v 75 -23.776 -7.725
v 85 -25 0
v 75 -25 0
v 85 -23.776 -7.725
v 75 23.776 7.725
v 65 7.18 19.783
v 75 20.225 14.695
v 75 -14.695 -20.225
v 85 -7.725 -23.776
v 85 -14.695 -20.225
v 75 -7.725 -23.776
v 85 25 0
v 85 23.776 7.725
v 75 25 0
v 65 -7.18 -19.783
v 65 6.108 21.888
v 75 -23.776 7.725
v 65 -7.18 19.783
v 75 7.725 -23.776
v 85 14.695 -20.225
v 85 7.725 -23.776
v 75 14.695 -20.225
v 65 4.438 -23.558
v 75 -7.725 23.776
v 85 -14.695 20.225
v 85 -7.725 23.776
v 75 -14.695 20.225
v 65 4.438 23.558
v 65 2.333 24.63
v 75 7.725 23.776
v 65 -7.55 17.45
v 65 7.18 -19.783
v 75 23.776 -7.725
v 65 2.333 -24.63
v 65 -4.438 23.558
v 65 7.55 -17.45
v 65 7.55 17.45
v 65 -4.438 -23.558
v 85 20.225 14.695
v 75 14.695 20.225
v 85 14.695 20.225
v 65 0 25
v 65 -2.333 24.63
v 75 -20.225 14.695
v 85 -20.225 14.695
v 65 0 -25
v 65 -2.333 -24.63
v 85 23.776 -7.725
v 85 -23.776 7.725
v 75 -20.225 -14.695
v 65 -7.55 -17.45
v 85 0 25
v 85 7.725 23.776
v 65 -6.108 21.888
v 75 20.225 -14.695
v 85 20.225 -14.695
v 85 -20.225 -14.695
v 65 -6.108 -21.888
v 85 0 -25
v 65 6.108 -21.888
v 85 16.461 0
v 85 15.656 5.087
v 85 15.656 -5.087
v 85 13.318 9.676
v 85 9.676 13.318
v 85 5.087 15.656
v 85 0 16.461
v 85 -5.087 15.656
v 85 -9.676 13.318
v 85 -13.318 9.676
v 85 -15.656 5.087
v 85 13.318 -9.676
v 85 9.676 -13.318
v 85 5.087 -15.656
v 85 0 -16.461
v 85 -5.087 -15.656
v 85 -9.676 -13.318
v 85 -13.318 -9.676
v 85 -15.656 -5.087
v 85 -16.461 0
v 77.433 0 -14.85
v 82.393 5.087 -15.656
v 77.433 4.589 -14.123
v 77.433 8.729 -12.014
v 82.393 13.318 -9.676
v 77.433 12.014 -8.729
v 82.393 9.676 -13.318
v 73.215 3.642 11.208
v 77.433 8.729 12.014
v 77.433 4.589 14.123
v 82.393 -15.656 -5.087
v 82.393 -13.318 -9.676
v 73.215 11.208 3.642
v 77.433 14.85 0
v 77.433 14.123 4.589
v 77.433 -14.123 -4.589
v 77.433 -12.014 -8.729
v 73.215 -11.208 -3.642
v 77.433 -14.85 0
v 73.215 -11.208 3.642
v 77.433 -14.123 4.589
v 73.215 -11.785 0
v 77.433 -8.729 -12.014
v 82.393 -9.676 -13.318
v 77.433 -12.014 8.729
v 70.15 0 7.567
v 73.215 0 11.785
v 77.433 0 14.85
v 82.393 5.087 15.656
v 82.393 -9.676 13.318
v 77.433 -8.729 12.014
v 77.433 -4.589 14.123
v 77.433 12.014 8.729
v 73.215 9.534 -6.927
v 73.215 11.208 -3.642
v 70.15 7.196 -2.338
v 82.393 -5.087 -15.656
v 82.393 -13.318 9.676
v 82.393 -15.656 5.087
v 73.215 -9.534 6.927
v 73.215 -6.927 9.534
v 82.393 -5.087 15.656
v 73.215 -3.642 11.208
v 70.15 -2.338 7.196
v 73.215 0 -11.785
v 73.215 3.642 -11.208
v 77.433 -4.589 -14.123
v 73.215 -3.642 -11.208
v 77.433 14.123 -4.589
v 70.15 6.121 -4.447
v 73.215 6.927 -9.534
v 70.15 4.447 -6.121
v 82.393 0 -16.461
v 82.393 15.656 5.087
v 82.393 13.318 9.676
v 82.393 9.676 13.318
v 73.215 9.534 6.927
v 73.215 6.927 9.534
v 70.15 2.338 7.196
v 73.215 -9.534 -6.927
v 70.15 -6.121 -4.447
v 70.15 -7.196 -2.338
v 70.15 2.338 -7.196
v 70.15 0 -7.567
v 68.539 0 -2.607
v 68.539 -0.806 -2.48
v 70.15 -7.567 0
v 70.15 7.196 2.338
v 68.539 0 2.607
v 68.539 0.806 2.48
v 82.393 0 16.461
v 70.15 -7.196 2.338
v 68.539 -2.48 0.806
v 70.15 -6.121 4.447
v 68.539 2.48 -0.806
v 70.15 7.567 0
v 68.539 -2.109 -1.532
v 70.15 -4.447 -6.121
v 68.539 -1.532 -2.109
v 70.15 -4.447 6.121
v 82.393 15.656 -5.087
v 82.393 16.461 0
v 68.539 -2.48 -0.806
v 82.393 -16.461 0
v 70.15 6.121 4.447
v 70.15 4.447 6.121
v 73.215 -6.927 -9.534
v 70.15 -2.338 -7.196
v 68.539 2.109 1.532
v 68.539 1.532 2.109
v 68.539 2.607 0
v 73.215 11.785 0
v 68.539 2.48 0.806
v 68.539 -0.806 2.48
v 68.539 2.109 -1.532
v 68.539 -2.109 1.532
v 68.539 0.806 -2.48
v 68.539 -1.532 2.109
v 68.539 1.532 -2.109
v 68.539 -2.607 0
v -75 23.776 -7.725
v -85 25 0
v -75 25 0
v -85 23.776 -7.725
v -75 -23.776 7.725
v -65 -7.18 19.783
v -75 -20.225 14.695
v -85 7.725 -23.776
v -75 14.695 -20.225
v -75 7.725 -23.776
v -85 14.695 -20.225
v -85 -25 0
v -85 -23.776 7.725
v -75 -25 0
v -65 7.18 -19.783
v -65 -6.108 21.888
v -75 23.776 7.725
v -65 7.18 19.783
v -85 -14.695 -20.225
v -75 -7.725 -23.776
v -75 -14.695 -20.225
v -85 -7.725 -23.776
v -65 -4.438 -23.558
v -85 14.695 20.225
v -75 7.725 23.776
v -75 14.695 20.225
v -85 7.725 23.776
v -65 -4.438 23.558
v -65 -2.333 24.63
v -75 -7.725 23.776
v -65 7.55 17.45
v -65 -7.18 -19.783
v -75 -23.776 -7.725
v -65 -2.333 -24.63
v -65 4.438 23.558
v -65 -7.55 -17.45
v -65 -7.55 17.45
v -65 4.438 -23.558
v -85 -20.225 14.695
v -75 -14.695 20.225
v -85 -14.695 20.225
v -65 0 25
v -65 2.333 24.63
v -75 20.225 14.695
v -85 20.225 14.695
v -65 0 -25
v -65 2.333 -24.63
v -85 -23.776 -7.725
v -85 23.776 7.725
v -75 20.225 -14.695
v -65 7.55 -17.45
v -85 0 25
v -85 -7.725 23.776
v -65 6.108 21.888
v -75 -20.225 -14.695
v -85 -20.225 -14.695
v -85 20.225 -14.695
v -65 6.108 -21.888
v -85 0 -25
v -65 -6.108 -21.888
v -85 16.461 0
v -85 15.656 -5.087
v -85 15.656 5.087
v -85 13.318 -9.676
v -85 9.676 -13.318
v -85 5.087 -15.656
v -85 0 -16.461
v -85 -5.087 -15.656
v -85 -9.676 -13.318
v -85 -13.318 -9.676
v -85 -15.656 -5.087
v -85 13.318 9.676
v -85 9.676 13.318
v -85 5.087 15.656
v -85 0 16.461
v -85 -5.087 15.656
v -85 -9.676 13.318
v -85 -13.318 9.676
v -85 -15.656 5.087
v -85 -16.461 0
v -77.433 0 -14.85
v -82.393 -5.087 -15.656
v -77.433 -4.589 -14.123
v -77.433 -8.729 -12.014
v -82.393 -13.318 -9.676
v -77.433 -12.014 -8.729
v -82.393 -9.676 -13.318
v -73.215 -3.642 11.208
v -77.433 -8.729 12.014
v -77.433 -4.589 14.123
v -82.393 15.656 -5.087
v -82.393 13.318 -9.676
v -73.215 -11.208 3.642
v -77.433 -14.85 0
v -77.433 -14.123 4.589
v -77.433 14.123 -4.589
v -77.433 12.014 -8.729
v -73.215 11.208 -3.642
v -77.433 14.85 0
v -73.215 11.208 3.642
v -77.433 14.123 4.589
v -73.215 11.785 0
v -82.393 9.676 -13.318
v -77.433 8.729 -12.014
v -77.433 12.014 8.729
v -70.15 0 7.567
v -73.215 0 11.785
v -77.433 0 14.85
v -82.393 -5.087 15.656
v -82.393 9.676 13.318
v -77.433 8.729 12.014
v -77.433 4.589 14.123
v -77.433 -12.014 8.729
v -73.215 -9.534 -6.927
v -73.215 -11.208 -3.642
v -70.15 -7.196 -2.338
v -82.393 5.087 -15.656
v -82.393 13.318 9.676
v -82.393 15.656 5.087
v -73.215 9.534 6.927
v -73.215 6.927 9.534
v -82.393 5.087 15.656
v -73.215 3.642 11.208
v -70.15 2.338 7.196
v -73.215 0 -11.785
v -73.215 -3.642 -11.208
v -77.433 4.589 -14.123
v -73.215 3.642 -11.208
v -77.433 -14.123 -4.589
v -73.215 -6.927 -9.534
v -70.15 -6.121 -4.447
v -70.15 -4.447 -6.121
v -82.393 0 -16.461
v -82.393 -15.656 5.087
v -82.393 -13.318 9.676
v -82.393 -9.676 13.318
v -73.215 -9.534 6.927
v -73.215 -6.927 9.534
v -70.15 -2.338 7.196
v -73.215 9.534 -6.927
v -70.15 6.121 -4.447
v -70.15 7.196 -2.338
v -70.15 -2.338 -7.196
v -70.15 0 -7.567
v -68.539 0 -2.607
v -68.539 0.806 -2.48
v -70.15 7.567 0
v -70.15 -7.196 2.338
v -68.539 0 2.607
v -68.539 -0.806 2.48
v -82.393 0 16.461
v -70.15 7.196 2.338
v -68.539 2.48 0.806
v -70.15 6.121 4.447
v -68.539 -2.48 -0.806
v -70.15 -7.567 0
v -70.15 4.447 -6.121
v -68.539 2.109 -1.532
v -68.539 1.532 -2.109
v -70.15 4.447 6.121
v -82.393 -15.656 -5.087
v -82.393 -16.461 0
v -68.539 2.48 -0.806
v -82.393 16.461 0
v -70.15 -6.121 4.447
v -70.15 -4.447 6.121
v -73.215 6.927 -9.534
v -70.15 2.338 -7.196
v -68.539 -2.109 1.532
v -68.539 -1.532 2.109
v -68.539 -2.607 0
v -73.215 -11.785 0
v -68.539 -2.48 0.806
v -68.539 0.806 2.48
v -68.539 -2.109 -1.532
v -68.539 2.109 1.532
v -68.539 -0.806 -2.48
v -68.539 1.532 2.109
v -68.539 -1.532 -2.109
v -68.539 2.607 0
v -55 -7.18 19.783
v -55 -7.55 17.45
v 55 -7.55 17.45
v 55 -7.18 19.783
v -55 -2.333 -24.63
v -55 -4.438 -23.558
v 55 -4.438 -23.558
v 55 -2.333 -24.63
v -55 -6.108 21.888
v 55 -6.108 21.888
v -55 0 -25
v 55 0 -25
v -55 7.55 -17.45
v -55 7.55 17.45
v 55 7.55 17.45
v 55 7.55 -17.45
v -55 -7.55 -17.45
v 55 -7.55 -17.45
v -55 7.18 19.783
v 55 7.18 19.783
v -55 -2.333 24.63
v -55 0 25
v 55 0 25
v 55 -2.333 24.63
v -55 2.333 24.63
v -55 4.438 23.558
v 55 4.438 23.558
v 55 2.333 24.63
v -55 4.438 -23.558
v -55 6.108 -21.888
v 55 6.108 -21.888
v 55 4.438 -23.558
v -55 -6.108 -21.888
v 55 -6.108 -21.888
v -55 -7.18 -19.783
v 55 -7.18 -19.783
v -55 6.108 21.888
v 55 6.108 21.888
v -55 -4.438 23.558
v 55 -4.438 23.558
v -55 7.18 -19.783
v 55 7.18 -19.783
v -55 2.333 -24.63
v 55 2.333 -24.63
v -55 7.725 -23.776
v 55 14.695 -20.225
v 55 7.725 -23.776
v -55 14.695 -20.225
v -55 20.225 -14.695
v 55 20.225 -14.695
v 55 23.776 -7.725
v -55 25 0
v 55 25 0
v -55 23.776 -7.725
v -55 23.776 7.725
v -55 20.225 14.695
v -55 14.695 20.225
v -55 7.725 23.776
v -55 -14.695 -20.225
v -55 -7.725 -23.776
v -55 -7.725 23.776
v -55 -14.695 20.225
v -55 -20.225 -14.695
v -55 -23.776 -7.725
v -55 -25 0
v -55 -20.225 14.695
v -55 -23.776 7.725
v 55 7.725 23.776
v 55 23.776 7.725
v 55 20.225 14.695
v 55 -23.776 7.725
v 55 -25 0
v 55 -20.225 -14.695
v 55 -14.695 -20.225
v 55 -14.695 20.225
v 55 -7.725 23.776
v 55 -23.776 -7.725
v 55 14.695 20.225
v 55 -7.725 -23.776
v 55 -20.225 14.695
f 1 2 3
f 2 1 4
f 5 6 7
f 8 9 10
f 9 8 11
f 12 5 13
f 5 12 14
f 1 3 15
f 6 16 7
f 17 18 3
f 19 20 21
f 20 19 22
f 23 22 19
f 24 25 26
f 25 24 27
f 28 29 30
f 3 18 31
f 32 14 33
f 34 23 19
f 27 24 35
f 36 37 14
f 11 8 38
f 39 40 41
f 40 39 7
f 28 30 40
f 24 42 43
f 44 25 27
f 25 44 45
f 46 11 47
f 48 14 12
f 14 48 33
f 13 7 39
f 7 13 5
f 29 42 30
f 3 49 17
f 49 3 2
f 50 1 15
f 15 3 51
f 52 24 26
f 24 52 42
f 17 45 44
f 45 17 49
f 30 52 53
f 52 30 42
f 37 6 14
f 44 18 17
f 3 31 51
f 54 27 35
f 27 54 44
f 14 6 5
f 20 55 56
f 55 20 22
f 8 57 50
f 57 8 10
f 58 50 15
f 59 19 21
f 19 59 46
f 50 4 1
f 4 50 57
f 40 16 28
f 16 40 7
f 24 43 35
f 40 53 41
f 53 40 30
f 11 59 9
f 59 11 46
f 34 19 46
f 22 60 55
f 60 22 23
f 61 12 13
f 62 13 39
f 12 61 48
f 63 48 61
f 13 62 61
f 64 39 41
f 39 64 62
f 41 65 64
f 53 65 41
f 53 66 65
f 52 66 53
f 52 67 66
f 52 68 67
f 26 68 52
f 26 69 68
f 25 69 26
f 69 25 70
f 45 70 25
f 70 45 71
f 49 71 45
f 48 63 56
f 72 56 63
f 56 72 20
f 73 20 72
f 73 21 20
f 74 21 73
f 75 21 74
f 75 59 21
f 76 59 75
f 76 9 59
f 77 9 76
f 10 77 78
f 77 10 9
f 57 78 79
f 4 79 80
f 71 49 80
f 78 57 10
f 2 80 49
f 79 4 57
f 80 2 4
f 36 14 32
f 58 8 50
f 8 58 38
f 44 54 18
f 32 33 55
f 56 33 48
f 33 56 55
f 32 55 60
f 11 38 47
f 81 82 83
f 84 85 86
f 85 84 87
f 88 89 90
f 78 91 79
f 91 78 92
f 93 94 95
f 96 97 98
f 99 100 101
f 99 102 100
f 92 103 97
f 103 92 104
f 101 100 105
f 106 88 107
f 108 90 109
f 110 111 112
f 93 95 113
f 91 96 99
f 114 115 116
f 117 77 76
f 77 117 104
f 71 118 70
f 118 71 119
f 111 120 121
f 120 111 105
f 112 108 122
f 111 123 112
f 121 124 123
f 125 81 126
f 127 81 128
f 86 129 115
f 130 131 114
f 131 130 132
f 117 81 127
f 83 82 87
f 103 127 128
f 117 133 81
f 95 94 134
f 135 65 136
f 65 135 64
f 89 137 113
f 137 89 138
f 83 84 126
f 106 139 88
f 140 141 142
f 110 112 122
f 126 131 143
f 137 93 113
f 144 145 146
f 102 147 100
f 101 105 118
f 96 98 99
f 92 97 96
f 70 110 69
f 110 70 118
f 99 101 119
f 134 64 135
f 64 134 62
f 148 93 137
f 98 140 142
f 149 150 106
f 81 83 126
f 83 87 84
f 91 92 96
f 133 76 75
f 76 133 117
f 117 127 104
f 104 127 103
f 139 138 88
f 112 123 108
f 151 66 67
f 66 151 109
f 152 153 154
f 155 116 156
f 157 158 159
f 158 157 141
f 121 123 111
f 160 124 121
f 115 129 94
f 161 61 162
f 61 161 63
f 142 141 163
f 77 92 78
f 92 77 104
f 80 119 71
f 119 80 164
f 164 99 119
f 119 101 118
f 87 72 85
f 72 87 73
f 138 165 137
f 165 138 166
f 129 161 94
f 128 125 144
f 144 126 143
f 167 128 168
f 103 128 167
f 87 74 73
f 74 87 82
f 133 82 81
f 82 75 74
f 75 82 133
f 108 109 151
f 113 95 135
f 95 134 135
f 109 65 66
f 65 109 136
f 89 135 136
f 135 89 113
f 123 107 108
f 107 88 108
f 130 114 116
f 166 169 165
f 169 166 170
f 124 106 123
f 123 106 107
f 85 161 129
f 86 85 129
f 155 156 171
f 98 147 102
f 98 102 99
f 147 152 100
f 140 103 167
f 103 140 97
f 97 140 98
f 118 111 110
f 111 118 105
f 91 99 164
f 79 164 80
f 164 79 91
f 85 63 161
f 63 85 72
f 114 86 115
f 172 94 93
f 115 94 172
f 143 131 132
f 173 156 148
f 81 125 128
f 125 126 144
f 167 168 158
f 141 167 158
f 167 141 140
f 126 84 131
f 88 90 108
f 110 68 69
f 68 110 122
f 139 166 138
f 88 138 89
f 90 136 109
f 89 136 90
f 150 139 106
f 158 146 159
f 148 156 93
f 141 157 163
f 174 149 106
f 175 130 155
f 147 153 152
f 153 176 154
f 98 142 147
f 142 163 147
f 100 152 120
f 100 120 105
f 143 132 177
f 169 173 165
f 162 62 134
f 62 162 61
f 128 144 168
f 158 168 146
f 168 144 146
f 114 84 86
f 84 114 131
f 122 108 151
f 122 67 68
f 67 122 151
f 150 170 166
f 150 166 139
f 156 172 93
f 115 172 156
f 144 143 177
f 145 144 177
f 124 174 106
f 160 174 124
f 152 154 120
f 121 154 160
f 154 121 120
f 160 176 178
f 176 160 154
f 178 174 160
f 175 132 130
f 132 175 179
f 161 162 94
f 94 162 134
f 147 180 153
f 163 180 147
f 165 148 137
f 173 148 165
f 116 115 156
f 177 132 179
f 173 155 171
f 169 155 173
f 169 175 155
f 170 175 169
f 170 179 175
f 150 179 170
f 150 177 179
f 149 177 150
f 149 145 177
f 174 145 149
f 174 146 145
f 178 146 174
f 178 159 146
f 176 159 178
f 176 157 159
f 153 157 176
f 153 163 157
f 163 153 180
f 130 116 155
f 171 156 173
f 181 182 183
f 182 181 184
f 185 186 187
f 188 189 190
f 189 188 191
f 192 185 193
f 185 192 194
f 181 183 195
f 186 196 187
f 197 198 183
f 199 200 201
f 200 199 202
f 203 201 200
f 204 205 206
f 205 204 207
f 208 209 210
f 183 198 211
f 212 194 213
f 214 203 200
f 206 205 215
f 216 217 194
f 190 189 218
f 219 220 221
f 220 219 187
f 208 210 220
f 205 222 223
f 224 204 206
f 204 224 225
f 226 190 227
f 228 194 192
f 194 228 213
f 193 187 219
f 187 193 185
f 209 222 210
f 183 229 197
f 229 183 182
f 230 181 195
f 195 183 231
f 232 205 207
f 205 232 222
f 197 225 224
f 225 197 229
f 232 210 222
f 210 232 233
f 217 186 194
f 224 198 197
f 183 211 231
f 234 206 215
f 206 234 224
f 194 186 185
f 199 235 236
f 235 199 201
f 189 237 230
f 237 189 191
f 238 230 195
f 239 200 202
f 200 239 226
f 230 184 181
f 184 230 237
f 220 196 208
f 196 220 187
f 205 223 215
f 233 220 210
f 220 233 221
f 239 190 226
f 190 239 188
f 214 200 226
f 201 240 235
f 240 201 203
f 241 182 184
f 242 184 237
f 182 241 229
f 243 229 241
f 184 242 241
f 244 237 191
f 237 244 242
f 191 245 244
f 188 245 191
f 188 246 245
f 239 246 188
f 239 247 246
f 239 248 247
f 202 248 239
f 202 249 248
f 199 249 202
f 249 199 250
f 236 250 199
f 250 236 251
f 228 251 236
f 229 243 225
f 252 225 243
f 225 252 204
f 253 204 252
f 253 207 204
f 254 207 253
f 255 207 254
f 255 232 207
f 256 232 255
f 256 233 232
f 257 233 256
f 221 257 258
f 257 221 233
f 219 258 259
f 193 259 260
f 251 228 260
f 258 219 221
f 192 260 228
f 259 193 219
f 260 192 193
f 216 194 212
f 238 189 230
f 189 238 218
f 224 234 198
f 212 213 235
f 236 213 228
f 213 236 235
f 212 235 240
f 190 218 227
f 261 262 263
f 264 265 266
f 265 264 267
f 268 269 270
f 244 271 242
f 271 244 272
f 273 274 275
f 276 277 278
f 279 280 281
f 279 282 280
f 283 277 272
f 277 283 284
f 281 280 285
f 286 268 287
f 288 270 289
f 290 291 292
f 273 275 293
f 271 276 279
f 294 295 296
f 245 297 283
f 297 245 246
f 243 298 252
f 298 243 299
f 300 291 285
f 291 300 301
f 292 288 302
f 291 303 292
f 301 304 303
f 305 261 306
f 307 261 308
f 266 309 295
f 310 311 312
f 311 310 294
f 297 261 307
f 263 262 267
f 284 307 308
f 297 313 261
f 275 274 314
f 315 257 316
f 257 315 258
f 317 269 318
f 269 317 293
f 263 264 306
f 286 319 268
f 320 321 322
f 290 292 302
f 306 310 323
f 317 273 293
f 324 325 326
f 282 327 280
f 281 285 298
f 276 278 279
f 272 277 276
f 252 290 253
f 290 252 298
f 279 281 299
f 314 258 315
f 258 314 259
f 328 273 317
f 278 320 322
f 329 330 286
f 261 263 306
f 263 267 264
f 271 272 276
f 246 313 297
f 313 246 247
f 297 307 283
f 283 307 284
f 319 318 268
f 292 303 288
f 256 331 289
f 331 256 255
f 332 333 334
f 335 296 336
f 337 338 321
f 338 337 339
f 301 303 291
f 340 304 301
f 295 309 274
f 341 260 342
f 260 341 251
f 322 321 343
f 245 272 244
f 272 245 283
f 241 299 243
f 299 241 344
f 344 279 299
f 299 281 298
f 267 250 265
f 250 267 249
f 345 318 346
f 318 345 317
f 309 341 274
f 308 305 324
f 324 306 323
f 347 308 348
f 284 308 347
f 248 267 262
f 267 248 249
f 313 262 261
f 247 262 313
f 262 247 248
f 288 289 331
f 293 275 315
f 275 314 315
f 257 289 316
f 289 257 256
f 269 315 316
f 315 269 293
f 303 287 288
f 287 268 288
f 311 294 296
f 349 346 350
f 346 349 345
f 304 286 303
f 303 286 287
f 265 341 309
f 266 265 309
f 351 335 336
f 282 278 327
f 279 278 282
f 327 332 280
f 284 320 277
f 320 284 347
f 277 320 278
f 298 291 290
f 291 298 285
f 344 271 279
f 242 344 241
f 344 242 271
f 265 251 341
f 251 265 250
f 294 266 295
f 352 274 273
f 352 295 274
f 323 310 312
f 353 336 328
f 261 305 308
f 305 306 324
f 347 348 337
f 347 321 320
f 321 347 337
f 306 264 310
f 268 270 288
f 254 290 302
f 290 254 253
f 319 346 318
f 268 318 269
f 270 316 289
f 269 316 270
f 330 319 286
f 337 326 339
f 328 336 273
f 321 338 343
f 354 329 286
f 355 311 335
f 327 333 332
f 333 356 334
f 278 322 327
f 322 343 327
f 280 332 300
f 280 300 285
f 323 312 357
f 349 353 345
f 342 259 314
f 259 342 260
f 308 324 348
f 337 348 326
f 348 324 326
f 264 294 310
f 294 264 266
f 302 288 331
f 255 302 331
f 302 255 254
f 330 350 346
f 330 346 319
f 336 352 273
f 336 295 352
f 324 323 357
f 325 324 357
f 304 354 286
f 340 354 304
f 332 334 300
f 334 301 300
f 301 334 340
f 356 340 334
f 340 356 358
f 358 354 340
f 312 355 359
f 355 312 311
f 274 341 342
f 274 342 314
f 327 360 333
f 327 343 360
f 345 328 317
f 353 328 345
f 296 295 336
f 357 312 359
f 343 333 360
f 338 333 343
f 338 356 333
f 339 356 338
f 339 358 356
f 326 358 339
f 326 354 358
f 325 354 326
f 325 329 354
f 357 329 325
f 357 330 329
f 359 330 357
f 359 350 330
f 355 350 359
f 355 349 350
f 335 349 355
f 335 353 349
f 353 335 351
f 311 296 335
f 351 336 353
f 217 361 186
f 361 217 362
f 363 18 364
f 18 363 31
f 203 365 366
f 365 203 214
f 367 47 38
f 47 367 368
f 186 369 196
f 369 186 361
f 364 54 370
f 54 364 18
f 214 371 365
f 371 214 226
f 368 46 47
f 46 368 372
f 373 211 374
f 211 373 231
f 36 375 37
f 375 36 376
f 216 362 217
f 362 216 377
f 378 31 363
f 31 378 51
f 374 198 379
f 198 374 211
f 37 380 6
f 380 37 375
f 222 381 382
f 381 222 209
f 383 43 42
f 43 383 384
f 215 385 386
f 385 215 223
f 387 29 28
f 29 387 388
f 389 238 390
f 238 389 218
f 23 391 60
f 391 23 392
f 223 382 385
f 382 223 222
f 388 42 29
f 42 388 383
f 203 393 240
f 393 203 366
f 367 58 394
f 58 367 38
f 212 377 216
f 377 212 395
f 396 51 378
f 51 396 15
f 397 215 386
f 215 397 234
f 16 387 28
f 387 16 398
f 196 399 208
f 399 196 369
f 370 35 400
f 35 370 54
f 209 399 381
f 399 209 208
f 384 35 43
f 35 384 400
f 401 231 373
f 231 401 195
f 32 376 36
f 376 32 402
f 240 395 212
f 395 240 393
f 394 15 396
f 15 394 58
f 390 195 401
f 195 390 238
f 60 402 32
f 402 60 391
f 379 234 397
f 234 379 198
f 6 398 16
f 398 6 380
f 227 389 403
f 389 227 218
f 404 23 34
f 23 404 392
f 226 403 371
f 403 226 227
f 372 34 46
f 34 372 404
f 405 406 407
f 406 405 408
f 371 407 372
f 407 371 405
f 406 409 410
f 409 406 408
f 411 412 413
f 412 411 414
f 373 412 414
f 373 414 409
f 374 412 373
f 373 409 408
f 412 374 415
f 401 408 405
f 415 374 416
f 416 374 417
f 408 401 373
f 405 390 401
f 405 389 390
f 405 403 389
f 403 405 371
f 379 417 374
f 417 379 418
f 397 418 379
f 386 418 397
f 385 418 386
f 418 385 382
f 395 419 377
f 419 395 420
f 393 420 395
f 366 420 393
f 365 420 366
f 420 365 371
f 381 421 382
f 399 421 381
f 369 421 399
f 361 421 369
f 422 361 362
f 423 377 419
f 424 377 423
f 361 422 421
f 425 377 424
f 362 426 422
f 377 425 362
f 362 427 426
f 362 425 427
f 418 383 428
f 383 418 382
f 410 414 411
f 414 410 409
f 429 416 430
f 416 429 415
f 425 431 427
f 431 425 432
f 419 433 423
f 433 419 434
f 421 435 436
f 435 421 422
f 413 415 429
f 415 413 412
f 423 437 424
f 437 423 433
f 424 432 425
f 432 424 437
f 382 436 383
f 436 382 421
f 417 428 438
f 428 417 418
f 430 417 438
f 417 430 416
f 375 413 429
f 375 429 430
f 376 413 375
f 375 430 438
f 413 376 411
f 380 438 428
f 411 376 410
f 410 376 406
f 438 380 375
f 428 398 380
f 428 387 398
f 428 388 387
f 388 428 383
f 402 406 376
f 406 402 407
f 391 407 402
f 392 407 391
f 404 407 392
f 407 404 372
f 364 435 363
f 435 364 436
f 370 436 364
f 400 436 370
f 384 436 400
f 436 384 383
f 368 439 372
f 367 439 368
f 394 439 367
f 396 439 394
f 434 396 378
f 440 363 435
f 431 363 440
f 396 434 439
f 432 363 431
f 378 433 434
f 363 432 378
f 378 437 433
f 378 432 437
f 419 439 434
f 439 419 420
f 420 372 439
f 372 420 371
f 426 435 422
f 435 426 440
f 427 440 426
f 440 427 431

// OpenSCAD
//roundcorner = true;
roundcorner = false;

//rc = true; 
rc = false;


$fn = roundcorner ? (rc ? 200 : 20) : 20;


roundcorner_size = roundcorner ? 5 : 0;

roller_main_shaft_length = 110;
roller_diameter = 50;

hanger_slot_span_slop = 0.1;
hanger_slot_span = 15 + hanger_slot_span_slop;

hanger_slot_width_slop = 0.0;
hanger_slot_width = 10 + hanger_slot_width_slop;

cap_crown_height = 10;
cap_funnel_height = 10;


module yardstick() {
    //translate([0, hanger_slot_span / 4, 0]) color("purple") cube([roller_diameter, hanger_slot_span, roller_main_shaft_length + ((hanger_slot_width + cap_funnel_height + cap_crown_height ) * 2)], center = true);
    translate([0, hanger_slot_span / 4, 0]) color("purple") cube([roller_diameter, hanger_slot_span, roller_main_shaft_length+ ((hanger_slot_width + cap_funnel_height + cap_crown_height ) * 2)], center = true);
}


module spine () {

    color("purple") hull () {
        translate([      (roller_diameter / 2) - (hanger_slot_span / 2), 0, 0] ) {
            cylinder(d = hanger_slot_span, h = roller_main_shaft_length + ((hanger_slot_width ) * 2), center = true);
        }
        translate([-1 * ((roller_diameter / 2) - (hanger_slot_span / 2)), 0, 0]) {
            cylinder(d = hanger_slot_span, h = roller_main_shaft_length + ((hanger_slot_width) * 2), center = true);
        }
    }    
}

module torso () {
    if (roundcorner) {
        minkowski() {
            cylinder(d = roller_diameter - roundcorner_size, h = roller_main_shaft_length - roundcorner_size, center = true);
            sphere(d=roundcorner_size);
        }
    } else {
        cylinder(d = roller_diameter, h = roller_main_shaft_length, center = true);
    }
}

module cap () {

    translate([0, 0, (roller_main_shaft_length / 2) + hanger_slot_width]) {

difference () {        
        color("pink") hull () {


            translate([      (roller_diameter / 2) - (hanger_slot_span / 2), 0, cap_funnel_height / 2] ) {
                color("green") cylinder(d = hanger_slot_span, h = cap_funnel_height, center = true);
            }
            translate([-1 * ((roller_diameter / 2) - (hanger_slot_span / 2)), 0, cap_funnel_height / 2]) {
                color("blue") cylinder(d = hanger_slot_span, h = cap_funnel_height, center = true);
            }


            translate([0, 0, cap_funnel_height]) {
                color("red") {
                    translate([0, 0, cap_crown_height / 2]) {
                        if (roundcorner) {
                            minkowski() {
                                cylinder(d = roller_diameter - roundcorner_size, h = cap_crown_height - roundcorner_size, center = true);
                                sphere(d=roundcorner_size);
                            }
                        } else {
                            cylinder(d = roller_diameter, h = cap_crown_height, center = true);
                        }
                    }
                }
            }
        }

        translate([0, 0, cap_funnel_height + cap_crown_height]) {
            sphere(d = roller_diameter * (2/3));
        }

    }
    }
}

rotate([0, 90, 0]) {
    spine();
    torso();
    cap();
    rotate([180, 0, 0]) cap();
    //yardstick();
}
